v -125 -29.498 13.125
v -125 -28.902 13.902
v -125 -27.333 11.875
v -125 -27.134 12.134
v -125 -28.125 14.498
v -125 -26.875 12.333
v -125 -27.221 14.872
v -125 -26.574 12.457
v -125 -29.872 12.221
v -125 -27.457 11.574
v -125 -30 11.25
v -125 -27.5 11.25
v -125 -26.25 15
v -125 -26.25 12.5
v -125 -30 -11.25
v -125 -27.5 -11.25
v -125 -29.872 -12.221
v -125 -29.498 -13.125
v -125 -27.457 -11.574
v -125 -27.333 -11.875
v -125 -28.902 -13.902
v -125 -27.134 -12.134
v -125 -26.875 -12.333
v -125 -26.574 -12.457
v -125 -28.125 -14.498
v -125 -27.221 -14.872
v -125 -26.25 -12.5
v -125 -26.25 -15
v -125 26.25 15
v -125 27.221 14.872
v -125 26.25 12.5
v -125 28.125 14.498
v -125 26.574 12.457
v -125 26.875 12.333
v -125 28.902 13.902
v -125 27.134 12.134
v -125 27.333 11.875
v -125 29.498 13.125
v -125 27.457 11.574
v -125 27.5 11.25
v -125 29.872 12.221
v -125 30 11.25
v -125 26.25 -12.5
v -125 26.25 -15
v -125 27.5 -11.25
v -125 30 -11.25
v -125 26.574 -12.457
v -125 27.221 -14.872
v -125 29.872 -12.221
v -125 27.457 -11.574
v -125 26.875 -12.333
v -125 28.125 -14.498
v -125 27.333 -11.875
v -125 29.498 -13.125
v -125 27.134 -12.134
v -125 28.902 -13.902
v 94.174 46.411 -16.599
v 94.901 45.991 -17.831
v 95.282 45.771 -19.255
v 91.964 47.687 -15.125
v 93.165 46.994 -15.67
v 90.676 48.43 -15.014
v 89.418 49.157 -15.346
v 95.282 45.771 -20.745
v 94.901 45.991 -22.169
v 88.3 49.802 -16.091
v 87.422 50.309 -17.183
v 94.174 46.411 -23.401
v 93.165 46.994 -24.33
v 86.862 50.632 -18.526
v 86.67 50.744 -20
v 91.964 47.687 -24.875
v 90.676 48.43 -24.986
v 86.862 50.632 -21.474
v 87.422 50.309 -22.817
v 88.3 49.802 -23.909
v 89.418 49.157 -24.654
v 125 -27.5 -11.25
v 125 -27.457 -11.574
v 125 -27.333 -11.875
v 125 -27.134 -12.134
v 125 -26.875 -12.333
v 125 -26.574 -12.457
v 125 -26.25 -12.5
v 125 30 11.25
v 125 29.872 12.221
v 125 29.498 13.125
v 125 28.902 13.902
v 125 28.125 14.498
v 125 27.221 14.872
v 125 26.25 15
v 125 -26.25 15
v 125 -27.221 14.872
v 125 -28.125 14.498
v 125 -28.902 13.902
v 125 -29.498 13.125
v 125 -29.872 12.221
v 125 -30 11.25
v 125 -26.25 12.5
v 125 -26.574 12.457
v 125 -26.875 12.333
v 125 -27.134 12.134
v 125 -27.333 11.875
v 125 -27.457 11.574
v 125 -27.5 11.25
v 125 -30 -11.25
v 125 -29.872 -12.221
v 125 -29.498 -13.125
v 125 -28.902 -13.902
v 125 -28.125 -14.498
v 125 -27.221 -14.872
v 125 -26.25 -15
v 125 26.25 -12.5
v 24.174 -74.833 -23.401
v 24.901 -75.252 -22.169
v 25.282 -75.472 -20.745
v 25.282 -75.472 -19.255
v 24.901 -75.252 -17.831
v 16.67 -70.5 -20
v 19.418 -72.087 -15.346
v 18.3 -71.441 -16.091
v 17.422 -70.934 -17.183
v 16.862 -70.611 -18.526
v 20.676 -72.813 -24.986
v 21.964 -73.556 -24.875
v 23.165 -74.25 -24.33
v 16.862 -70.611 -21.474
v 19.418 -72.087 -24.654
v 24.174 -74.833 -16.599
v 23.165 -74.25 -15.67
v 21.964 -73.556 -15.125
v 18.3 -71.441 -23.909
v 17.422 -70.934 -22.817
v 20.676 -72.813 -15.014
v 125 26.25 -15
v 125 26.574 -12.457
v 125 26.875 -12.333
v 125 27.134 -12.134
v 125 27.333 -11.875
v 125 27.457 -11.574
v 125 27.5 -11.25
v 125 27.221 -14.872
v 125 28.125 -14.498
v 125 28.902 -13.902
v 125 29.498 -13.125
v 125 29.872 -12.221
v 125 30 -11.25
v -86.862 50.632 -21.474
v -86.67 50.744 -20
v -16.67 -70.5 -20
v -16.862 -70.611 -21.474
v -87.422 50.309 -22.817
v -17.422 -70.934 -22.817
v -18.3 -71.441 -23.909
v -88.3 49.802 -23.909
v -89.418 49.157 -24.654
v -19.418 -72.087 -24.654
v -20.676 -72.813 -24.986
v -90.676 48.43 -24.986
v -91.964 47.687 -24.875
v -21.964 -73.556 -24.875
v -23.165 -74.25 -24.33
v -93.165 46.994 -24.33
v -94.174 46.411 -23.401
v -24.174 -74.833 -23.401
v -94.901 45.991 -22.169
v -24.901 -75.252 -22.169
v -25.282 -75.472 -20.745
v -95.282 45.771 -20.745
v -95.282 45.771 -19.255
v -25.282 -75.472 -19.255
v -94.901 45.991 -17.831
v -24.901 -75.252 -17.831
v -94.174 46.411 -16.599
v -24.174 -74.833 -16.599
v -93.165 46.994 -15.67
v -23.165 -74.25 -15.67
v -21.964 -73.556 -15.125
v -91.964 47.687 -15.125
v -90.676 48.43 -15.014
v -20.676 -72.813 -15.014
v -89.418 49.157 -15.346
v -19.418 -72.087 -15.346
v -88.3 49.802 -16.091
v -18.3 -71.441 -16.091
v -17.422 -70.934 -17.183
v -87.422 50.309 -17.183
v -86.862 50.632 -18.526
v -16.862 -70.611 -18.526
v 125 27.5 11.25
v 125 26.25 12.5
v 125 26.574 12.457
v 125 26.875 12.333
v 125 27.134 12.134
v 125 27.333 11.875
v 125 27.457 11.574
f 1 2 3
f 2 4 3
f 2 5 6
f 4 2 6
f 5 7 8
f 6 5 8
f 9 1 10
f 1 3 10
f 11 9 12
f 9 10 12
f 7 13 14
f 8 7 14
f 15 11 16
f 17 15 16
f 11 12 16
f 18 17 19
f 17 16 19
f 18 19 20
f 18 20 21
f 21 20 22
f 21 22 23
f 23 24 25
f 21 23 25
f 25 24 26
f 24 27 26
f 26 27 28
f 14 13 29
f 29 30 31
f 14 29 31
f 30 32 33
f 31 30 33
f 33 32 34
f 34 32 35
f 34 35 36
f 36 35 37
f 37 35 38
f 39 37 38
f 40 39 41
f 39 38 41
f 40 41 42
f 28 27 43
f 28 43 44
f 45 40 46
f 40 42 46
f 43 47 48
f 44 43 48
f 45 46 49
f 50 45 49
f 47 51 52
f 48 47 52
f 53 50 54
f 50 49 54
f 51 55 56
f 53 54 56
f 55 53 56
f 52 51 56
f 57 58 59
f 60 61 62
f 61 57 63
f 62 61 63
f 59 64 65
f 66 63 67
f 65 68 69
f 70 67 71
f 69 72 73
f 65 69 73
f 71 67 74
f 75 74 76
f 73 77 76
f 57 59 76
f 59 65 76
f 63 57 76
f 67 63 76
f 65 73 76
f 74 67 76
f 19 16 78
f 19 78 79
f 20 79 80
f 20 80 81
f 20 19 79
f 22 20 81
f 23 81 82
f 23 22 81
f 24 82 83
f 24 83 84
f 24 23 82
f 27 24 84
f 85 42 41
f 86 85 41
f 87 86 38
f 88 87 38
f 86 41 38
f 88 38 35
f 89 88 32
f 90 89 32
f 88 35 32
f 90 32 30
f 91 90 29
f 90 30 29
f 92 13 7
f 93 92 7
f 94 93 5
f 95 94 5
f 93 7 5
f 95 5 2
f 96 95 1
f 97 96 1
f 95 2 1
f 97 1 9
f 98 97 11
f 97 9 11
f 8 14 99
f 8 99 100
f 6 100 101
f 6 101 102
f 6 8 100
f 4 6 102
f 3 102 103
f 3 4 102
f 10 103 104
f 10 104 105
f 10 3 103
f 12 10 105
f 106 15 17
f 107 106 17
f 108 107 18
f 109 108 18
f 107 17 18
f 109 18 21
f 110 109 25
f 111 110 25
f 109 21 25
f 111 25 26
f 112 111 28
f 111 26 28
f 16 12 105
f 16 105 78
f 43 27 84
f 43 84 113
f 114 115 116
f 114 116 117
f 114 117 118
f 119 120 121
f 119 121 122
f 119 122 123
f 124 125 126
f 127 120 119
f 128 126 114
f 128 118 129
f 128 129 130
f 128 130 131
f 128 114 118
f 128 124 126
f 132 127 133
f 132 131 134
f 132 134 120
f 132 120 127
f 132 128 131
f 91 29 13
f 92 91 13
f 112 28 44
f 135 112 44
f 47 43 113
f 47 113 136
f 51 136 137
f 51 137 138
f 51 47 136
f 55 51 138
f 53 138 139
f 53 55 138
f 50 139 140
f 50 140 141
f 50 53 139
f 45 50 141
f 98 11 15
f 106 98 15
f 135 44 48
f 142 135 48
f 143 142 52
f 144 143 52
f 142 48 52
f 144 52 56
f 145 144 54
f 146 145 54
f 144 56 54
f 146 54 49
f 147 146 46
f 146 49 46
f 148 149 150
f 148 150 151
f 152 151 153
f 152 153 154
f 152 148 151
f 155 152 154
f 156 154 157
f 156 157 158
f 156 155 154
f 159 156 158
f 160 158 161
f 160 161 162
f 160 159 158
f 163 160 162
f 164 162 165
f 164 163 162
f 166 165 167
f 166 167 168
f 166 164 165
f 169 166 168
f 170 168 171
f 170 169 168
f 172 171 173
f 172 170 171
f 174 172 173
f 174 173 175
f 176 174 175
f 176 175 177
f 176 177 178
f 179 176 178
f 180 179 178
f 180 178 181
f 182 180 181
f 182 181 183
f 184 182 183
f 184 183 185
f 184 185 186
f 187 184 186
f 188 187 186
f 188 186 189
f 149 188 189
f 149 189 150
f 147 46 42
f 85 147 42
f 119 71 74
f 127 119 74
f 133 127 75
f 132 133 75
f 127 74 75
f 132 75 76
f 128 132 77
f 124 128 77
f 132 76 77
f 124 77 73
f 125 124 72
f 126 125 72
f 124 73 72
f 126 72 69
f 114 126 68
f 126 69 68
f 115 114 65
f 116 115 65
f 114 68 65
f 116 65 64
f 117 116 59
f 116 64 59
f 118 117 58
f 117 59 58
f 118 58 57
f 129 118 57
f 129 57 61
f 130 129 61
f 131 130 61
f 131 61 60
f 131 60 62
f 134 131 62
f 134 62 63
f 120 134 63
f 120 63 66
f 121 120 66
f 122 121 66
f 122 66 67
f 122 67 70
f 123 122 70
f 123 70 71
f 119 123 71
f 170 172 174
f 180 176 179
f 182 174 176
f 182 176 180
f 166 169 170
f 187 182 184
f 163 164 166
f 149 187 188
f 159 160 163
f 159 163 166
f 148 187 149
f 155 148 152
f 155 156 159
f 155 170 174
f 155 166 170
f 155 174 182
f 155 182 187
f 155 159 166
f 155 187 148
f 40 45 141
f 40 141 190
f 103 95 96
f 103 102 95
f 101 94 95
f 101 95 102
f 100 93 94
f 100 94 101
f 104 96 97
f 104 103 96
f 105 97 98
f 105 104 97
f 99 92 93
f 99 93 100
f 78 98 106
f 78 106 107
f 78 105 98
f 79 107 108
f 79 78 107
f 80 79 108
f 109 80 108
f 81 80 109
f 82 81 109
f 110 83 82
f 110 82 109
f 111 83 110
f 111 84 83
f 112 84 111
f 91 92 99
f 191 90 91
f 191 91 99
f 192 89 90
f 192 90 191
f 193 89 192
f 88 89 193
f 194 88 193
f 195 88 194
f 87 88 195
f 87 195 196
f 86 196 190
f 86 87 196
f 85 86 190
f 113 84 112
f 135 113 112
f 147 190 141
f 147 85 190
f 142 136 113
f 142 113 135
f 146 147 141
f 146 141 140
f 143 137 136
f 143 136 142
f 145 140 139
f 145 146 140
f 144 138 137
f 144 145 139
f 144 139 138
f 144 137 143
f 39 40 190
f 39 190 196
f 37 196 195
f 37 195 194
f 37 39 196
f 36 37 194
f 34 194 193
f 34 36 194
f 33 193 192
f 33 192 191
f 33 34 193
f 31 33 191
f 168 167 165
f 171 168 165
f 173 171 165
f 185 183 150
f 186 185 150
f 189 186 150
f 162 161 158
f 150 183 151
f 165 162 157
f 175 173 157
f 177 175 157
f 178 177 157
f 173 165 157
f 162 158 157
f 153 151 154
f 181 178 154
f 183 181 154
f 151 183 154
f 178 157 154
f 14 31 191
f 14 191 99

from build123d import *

# Parameters (mm, degrees)
AXBXS_8645_68_60_X_30_X_3_1_DEPTH = 250
SKETCH_4_R                        = 5


with BuildPart() as part:
    # Sketch1 → Труба axbxs гост8645-68 60 X 30 X 3(1) (new body)
    with BuildSketch(Plane(origin=(-125, 0, 0), x_dir=(0, 0, -1), z_dir=(1, 0, 0))):
        with BuildLine():
            Line((-11.25, -30), (11.25, -30))
            ThreePointArc((11.25, -30), (13.901650429, -28.901650429), (15, -26.25))
            Line((15, -26.25), (15, 26.25))
            ThreePointArc((15, 26.25), (13.901650429, 28.901650429), (11.25, 30))
            Line((11.25, 30), (-11.25, 30))
            ThreePointArc((-11.25, 30), (-13.901650429, 28.901650429), (-15, 26.25))
            Line((-15, 26.25), (-15, -26.25))
            ThreePointArc((-15, -26.25), (-13.901650429, -28.901650429), (-11.25, -30))
        make_face()
        with BuildLine():
            Line((-11.25, -27.5), (11.25, -27.5))
            ThreePointArc((11.25, -27.5), (12.133883476, -27.133883476), (12.5, -26.25))
            Line((12.5, -26.25), (12.5, 26.25))
            ThreePointArc((12.5, 26.25), (12.133883476, 27.133883476), (11.25, 27.5))
            Line((11.25, 27.5), (-11.25, 27.5))
            ThreePointArc((-11.25, 27.5), (-12.133883476, 27.133883476), (-12.5, 26.25))
            Line((-12.5, 26.25), (-12.5, -26.25))
            ThreePointArc((-12.5, -26.25), (-12.133883476, -27.133883476), (-11.25, -27.5))
        make_face(mode=Mode.SUBTRACT)
    extrude(amount=AXBXS_8645_68_60_X_30_X_3_1_DEPTH)


with BuildPart() as body_2:
    # По траектории1: sweep along a path in Эскиз3
    with BuildLine(Plane(origin=(0, 0, -20), x_dir=(-1, 0, 0), z_dir=(0, 0, -1))) as sweep_1_path:
        Line((21, -73), (91, 48.24355653))
    # Эскиз4 → По траектории1 (sweep)
    with BuildSketch(Plane(origin=(-21, -73, -20), x_dir=(0.8660254037844387, 0.4999999999999999, 0), z_dir=(-0.49999999999999994, 0.8660254037844388, 0))):
        Circle(SKETCH_4_R)
    sweep(path=sweep_1_path.line)


with BuildPart() as body_3:
    # Зеркальное отражение1: mirrored copy
    add(body_2.part.mirror(Plane(origin=(0, 0, 0), x_dir=(0, 0, 1), z_dir=(1, 0, 0))))


solid = Compound([part.part, body_2.part, body_3.part])
